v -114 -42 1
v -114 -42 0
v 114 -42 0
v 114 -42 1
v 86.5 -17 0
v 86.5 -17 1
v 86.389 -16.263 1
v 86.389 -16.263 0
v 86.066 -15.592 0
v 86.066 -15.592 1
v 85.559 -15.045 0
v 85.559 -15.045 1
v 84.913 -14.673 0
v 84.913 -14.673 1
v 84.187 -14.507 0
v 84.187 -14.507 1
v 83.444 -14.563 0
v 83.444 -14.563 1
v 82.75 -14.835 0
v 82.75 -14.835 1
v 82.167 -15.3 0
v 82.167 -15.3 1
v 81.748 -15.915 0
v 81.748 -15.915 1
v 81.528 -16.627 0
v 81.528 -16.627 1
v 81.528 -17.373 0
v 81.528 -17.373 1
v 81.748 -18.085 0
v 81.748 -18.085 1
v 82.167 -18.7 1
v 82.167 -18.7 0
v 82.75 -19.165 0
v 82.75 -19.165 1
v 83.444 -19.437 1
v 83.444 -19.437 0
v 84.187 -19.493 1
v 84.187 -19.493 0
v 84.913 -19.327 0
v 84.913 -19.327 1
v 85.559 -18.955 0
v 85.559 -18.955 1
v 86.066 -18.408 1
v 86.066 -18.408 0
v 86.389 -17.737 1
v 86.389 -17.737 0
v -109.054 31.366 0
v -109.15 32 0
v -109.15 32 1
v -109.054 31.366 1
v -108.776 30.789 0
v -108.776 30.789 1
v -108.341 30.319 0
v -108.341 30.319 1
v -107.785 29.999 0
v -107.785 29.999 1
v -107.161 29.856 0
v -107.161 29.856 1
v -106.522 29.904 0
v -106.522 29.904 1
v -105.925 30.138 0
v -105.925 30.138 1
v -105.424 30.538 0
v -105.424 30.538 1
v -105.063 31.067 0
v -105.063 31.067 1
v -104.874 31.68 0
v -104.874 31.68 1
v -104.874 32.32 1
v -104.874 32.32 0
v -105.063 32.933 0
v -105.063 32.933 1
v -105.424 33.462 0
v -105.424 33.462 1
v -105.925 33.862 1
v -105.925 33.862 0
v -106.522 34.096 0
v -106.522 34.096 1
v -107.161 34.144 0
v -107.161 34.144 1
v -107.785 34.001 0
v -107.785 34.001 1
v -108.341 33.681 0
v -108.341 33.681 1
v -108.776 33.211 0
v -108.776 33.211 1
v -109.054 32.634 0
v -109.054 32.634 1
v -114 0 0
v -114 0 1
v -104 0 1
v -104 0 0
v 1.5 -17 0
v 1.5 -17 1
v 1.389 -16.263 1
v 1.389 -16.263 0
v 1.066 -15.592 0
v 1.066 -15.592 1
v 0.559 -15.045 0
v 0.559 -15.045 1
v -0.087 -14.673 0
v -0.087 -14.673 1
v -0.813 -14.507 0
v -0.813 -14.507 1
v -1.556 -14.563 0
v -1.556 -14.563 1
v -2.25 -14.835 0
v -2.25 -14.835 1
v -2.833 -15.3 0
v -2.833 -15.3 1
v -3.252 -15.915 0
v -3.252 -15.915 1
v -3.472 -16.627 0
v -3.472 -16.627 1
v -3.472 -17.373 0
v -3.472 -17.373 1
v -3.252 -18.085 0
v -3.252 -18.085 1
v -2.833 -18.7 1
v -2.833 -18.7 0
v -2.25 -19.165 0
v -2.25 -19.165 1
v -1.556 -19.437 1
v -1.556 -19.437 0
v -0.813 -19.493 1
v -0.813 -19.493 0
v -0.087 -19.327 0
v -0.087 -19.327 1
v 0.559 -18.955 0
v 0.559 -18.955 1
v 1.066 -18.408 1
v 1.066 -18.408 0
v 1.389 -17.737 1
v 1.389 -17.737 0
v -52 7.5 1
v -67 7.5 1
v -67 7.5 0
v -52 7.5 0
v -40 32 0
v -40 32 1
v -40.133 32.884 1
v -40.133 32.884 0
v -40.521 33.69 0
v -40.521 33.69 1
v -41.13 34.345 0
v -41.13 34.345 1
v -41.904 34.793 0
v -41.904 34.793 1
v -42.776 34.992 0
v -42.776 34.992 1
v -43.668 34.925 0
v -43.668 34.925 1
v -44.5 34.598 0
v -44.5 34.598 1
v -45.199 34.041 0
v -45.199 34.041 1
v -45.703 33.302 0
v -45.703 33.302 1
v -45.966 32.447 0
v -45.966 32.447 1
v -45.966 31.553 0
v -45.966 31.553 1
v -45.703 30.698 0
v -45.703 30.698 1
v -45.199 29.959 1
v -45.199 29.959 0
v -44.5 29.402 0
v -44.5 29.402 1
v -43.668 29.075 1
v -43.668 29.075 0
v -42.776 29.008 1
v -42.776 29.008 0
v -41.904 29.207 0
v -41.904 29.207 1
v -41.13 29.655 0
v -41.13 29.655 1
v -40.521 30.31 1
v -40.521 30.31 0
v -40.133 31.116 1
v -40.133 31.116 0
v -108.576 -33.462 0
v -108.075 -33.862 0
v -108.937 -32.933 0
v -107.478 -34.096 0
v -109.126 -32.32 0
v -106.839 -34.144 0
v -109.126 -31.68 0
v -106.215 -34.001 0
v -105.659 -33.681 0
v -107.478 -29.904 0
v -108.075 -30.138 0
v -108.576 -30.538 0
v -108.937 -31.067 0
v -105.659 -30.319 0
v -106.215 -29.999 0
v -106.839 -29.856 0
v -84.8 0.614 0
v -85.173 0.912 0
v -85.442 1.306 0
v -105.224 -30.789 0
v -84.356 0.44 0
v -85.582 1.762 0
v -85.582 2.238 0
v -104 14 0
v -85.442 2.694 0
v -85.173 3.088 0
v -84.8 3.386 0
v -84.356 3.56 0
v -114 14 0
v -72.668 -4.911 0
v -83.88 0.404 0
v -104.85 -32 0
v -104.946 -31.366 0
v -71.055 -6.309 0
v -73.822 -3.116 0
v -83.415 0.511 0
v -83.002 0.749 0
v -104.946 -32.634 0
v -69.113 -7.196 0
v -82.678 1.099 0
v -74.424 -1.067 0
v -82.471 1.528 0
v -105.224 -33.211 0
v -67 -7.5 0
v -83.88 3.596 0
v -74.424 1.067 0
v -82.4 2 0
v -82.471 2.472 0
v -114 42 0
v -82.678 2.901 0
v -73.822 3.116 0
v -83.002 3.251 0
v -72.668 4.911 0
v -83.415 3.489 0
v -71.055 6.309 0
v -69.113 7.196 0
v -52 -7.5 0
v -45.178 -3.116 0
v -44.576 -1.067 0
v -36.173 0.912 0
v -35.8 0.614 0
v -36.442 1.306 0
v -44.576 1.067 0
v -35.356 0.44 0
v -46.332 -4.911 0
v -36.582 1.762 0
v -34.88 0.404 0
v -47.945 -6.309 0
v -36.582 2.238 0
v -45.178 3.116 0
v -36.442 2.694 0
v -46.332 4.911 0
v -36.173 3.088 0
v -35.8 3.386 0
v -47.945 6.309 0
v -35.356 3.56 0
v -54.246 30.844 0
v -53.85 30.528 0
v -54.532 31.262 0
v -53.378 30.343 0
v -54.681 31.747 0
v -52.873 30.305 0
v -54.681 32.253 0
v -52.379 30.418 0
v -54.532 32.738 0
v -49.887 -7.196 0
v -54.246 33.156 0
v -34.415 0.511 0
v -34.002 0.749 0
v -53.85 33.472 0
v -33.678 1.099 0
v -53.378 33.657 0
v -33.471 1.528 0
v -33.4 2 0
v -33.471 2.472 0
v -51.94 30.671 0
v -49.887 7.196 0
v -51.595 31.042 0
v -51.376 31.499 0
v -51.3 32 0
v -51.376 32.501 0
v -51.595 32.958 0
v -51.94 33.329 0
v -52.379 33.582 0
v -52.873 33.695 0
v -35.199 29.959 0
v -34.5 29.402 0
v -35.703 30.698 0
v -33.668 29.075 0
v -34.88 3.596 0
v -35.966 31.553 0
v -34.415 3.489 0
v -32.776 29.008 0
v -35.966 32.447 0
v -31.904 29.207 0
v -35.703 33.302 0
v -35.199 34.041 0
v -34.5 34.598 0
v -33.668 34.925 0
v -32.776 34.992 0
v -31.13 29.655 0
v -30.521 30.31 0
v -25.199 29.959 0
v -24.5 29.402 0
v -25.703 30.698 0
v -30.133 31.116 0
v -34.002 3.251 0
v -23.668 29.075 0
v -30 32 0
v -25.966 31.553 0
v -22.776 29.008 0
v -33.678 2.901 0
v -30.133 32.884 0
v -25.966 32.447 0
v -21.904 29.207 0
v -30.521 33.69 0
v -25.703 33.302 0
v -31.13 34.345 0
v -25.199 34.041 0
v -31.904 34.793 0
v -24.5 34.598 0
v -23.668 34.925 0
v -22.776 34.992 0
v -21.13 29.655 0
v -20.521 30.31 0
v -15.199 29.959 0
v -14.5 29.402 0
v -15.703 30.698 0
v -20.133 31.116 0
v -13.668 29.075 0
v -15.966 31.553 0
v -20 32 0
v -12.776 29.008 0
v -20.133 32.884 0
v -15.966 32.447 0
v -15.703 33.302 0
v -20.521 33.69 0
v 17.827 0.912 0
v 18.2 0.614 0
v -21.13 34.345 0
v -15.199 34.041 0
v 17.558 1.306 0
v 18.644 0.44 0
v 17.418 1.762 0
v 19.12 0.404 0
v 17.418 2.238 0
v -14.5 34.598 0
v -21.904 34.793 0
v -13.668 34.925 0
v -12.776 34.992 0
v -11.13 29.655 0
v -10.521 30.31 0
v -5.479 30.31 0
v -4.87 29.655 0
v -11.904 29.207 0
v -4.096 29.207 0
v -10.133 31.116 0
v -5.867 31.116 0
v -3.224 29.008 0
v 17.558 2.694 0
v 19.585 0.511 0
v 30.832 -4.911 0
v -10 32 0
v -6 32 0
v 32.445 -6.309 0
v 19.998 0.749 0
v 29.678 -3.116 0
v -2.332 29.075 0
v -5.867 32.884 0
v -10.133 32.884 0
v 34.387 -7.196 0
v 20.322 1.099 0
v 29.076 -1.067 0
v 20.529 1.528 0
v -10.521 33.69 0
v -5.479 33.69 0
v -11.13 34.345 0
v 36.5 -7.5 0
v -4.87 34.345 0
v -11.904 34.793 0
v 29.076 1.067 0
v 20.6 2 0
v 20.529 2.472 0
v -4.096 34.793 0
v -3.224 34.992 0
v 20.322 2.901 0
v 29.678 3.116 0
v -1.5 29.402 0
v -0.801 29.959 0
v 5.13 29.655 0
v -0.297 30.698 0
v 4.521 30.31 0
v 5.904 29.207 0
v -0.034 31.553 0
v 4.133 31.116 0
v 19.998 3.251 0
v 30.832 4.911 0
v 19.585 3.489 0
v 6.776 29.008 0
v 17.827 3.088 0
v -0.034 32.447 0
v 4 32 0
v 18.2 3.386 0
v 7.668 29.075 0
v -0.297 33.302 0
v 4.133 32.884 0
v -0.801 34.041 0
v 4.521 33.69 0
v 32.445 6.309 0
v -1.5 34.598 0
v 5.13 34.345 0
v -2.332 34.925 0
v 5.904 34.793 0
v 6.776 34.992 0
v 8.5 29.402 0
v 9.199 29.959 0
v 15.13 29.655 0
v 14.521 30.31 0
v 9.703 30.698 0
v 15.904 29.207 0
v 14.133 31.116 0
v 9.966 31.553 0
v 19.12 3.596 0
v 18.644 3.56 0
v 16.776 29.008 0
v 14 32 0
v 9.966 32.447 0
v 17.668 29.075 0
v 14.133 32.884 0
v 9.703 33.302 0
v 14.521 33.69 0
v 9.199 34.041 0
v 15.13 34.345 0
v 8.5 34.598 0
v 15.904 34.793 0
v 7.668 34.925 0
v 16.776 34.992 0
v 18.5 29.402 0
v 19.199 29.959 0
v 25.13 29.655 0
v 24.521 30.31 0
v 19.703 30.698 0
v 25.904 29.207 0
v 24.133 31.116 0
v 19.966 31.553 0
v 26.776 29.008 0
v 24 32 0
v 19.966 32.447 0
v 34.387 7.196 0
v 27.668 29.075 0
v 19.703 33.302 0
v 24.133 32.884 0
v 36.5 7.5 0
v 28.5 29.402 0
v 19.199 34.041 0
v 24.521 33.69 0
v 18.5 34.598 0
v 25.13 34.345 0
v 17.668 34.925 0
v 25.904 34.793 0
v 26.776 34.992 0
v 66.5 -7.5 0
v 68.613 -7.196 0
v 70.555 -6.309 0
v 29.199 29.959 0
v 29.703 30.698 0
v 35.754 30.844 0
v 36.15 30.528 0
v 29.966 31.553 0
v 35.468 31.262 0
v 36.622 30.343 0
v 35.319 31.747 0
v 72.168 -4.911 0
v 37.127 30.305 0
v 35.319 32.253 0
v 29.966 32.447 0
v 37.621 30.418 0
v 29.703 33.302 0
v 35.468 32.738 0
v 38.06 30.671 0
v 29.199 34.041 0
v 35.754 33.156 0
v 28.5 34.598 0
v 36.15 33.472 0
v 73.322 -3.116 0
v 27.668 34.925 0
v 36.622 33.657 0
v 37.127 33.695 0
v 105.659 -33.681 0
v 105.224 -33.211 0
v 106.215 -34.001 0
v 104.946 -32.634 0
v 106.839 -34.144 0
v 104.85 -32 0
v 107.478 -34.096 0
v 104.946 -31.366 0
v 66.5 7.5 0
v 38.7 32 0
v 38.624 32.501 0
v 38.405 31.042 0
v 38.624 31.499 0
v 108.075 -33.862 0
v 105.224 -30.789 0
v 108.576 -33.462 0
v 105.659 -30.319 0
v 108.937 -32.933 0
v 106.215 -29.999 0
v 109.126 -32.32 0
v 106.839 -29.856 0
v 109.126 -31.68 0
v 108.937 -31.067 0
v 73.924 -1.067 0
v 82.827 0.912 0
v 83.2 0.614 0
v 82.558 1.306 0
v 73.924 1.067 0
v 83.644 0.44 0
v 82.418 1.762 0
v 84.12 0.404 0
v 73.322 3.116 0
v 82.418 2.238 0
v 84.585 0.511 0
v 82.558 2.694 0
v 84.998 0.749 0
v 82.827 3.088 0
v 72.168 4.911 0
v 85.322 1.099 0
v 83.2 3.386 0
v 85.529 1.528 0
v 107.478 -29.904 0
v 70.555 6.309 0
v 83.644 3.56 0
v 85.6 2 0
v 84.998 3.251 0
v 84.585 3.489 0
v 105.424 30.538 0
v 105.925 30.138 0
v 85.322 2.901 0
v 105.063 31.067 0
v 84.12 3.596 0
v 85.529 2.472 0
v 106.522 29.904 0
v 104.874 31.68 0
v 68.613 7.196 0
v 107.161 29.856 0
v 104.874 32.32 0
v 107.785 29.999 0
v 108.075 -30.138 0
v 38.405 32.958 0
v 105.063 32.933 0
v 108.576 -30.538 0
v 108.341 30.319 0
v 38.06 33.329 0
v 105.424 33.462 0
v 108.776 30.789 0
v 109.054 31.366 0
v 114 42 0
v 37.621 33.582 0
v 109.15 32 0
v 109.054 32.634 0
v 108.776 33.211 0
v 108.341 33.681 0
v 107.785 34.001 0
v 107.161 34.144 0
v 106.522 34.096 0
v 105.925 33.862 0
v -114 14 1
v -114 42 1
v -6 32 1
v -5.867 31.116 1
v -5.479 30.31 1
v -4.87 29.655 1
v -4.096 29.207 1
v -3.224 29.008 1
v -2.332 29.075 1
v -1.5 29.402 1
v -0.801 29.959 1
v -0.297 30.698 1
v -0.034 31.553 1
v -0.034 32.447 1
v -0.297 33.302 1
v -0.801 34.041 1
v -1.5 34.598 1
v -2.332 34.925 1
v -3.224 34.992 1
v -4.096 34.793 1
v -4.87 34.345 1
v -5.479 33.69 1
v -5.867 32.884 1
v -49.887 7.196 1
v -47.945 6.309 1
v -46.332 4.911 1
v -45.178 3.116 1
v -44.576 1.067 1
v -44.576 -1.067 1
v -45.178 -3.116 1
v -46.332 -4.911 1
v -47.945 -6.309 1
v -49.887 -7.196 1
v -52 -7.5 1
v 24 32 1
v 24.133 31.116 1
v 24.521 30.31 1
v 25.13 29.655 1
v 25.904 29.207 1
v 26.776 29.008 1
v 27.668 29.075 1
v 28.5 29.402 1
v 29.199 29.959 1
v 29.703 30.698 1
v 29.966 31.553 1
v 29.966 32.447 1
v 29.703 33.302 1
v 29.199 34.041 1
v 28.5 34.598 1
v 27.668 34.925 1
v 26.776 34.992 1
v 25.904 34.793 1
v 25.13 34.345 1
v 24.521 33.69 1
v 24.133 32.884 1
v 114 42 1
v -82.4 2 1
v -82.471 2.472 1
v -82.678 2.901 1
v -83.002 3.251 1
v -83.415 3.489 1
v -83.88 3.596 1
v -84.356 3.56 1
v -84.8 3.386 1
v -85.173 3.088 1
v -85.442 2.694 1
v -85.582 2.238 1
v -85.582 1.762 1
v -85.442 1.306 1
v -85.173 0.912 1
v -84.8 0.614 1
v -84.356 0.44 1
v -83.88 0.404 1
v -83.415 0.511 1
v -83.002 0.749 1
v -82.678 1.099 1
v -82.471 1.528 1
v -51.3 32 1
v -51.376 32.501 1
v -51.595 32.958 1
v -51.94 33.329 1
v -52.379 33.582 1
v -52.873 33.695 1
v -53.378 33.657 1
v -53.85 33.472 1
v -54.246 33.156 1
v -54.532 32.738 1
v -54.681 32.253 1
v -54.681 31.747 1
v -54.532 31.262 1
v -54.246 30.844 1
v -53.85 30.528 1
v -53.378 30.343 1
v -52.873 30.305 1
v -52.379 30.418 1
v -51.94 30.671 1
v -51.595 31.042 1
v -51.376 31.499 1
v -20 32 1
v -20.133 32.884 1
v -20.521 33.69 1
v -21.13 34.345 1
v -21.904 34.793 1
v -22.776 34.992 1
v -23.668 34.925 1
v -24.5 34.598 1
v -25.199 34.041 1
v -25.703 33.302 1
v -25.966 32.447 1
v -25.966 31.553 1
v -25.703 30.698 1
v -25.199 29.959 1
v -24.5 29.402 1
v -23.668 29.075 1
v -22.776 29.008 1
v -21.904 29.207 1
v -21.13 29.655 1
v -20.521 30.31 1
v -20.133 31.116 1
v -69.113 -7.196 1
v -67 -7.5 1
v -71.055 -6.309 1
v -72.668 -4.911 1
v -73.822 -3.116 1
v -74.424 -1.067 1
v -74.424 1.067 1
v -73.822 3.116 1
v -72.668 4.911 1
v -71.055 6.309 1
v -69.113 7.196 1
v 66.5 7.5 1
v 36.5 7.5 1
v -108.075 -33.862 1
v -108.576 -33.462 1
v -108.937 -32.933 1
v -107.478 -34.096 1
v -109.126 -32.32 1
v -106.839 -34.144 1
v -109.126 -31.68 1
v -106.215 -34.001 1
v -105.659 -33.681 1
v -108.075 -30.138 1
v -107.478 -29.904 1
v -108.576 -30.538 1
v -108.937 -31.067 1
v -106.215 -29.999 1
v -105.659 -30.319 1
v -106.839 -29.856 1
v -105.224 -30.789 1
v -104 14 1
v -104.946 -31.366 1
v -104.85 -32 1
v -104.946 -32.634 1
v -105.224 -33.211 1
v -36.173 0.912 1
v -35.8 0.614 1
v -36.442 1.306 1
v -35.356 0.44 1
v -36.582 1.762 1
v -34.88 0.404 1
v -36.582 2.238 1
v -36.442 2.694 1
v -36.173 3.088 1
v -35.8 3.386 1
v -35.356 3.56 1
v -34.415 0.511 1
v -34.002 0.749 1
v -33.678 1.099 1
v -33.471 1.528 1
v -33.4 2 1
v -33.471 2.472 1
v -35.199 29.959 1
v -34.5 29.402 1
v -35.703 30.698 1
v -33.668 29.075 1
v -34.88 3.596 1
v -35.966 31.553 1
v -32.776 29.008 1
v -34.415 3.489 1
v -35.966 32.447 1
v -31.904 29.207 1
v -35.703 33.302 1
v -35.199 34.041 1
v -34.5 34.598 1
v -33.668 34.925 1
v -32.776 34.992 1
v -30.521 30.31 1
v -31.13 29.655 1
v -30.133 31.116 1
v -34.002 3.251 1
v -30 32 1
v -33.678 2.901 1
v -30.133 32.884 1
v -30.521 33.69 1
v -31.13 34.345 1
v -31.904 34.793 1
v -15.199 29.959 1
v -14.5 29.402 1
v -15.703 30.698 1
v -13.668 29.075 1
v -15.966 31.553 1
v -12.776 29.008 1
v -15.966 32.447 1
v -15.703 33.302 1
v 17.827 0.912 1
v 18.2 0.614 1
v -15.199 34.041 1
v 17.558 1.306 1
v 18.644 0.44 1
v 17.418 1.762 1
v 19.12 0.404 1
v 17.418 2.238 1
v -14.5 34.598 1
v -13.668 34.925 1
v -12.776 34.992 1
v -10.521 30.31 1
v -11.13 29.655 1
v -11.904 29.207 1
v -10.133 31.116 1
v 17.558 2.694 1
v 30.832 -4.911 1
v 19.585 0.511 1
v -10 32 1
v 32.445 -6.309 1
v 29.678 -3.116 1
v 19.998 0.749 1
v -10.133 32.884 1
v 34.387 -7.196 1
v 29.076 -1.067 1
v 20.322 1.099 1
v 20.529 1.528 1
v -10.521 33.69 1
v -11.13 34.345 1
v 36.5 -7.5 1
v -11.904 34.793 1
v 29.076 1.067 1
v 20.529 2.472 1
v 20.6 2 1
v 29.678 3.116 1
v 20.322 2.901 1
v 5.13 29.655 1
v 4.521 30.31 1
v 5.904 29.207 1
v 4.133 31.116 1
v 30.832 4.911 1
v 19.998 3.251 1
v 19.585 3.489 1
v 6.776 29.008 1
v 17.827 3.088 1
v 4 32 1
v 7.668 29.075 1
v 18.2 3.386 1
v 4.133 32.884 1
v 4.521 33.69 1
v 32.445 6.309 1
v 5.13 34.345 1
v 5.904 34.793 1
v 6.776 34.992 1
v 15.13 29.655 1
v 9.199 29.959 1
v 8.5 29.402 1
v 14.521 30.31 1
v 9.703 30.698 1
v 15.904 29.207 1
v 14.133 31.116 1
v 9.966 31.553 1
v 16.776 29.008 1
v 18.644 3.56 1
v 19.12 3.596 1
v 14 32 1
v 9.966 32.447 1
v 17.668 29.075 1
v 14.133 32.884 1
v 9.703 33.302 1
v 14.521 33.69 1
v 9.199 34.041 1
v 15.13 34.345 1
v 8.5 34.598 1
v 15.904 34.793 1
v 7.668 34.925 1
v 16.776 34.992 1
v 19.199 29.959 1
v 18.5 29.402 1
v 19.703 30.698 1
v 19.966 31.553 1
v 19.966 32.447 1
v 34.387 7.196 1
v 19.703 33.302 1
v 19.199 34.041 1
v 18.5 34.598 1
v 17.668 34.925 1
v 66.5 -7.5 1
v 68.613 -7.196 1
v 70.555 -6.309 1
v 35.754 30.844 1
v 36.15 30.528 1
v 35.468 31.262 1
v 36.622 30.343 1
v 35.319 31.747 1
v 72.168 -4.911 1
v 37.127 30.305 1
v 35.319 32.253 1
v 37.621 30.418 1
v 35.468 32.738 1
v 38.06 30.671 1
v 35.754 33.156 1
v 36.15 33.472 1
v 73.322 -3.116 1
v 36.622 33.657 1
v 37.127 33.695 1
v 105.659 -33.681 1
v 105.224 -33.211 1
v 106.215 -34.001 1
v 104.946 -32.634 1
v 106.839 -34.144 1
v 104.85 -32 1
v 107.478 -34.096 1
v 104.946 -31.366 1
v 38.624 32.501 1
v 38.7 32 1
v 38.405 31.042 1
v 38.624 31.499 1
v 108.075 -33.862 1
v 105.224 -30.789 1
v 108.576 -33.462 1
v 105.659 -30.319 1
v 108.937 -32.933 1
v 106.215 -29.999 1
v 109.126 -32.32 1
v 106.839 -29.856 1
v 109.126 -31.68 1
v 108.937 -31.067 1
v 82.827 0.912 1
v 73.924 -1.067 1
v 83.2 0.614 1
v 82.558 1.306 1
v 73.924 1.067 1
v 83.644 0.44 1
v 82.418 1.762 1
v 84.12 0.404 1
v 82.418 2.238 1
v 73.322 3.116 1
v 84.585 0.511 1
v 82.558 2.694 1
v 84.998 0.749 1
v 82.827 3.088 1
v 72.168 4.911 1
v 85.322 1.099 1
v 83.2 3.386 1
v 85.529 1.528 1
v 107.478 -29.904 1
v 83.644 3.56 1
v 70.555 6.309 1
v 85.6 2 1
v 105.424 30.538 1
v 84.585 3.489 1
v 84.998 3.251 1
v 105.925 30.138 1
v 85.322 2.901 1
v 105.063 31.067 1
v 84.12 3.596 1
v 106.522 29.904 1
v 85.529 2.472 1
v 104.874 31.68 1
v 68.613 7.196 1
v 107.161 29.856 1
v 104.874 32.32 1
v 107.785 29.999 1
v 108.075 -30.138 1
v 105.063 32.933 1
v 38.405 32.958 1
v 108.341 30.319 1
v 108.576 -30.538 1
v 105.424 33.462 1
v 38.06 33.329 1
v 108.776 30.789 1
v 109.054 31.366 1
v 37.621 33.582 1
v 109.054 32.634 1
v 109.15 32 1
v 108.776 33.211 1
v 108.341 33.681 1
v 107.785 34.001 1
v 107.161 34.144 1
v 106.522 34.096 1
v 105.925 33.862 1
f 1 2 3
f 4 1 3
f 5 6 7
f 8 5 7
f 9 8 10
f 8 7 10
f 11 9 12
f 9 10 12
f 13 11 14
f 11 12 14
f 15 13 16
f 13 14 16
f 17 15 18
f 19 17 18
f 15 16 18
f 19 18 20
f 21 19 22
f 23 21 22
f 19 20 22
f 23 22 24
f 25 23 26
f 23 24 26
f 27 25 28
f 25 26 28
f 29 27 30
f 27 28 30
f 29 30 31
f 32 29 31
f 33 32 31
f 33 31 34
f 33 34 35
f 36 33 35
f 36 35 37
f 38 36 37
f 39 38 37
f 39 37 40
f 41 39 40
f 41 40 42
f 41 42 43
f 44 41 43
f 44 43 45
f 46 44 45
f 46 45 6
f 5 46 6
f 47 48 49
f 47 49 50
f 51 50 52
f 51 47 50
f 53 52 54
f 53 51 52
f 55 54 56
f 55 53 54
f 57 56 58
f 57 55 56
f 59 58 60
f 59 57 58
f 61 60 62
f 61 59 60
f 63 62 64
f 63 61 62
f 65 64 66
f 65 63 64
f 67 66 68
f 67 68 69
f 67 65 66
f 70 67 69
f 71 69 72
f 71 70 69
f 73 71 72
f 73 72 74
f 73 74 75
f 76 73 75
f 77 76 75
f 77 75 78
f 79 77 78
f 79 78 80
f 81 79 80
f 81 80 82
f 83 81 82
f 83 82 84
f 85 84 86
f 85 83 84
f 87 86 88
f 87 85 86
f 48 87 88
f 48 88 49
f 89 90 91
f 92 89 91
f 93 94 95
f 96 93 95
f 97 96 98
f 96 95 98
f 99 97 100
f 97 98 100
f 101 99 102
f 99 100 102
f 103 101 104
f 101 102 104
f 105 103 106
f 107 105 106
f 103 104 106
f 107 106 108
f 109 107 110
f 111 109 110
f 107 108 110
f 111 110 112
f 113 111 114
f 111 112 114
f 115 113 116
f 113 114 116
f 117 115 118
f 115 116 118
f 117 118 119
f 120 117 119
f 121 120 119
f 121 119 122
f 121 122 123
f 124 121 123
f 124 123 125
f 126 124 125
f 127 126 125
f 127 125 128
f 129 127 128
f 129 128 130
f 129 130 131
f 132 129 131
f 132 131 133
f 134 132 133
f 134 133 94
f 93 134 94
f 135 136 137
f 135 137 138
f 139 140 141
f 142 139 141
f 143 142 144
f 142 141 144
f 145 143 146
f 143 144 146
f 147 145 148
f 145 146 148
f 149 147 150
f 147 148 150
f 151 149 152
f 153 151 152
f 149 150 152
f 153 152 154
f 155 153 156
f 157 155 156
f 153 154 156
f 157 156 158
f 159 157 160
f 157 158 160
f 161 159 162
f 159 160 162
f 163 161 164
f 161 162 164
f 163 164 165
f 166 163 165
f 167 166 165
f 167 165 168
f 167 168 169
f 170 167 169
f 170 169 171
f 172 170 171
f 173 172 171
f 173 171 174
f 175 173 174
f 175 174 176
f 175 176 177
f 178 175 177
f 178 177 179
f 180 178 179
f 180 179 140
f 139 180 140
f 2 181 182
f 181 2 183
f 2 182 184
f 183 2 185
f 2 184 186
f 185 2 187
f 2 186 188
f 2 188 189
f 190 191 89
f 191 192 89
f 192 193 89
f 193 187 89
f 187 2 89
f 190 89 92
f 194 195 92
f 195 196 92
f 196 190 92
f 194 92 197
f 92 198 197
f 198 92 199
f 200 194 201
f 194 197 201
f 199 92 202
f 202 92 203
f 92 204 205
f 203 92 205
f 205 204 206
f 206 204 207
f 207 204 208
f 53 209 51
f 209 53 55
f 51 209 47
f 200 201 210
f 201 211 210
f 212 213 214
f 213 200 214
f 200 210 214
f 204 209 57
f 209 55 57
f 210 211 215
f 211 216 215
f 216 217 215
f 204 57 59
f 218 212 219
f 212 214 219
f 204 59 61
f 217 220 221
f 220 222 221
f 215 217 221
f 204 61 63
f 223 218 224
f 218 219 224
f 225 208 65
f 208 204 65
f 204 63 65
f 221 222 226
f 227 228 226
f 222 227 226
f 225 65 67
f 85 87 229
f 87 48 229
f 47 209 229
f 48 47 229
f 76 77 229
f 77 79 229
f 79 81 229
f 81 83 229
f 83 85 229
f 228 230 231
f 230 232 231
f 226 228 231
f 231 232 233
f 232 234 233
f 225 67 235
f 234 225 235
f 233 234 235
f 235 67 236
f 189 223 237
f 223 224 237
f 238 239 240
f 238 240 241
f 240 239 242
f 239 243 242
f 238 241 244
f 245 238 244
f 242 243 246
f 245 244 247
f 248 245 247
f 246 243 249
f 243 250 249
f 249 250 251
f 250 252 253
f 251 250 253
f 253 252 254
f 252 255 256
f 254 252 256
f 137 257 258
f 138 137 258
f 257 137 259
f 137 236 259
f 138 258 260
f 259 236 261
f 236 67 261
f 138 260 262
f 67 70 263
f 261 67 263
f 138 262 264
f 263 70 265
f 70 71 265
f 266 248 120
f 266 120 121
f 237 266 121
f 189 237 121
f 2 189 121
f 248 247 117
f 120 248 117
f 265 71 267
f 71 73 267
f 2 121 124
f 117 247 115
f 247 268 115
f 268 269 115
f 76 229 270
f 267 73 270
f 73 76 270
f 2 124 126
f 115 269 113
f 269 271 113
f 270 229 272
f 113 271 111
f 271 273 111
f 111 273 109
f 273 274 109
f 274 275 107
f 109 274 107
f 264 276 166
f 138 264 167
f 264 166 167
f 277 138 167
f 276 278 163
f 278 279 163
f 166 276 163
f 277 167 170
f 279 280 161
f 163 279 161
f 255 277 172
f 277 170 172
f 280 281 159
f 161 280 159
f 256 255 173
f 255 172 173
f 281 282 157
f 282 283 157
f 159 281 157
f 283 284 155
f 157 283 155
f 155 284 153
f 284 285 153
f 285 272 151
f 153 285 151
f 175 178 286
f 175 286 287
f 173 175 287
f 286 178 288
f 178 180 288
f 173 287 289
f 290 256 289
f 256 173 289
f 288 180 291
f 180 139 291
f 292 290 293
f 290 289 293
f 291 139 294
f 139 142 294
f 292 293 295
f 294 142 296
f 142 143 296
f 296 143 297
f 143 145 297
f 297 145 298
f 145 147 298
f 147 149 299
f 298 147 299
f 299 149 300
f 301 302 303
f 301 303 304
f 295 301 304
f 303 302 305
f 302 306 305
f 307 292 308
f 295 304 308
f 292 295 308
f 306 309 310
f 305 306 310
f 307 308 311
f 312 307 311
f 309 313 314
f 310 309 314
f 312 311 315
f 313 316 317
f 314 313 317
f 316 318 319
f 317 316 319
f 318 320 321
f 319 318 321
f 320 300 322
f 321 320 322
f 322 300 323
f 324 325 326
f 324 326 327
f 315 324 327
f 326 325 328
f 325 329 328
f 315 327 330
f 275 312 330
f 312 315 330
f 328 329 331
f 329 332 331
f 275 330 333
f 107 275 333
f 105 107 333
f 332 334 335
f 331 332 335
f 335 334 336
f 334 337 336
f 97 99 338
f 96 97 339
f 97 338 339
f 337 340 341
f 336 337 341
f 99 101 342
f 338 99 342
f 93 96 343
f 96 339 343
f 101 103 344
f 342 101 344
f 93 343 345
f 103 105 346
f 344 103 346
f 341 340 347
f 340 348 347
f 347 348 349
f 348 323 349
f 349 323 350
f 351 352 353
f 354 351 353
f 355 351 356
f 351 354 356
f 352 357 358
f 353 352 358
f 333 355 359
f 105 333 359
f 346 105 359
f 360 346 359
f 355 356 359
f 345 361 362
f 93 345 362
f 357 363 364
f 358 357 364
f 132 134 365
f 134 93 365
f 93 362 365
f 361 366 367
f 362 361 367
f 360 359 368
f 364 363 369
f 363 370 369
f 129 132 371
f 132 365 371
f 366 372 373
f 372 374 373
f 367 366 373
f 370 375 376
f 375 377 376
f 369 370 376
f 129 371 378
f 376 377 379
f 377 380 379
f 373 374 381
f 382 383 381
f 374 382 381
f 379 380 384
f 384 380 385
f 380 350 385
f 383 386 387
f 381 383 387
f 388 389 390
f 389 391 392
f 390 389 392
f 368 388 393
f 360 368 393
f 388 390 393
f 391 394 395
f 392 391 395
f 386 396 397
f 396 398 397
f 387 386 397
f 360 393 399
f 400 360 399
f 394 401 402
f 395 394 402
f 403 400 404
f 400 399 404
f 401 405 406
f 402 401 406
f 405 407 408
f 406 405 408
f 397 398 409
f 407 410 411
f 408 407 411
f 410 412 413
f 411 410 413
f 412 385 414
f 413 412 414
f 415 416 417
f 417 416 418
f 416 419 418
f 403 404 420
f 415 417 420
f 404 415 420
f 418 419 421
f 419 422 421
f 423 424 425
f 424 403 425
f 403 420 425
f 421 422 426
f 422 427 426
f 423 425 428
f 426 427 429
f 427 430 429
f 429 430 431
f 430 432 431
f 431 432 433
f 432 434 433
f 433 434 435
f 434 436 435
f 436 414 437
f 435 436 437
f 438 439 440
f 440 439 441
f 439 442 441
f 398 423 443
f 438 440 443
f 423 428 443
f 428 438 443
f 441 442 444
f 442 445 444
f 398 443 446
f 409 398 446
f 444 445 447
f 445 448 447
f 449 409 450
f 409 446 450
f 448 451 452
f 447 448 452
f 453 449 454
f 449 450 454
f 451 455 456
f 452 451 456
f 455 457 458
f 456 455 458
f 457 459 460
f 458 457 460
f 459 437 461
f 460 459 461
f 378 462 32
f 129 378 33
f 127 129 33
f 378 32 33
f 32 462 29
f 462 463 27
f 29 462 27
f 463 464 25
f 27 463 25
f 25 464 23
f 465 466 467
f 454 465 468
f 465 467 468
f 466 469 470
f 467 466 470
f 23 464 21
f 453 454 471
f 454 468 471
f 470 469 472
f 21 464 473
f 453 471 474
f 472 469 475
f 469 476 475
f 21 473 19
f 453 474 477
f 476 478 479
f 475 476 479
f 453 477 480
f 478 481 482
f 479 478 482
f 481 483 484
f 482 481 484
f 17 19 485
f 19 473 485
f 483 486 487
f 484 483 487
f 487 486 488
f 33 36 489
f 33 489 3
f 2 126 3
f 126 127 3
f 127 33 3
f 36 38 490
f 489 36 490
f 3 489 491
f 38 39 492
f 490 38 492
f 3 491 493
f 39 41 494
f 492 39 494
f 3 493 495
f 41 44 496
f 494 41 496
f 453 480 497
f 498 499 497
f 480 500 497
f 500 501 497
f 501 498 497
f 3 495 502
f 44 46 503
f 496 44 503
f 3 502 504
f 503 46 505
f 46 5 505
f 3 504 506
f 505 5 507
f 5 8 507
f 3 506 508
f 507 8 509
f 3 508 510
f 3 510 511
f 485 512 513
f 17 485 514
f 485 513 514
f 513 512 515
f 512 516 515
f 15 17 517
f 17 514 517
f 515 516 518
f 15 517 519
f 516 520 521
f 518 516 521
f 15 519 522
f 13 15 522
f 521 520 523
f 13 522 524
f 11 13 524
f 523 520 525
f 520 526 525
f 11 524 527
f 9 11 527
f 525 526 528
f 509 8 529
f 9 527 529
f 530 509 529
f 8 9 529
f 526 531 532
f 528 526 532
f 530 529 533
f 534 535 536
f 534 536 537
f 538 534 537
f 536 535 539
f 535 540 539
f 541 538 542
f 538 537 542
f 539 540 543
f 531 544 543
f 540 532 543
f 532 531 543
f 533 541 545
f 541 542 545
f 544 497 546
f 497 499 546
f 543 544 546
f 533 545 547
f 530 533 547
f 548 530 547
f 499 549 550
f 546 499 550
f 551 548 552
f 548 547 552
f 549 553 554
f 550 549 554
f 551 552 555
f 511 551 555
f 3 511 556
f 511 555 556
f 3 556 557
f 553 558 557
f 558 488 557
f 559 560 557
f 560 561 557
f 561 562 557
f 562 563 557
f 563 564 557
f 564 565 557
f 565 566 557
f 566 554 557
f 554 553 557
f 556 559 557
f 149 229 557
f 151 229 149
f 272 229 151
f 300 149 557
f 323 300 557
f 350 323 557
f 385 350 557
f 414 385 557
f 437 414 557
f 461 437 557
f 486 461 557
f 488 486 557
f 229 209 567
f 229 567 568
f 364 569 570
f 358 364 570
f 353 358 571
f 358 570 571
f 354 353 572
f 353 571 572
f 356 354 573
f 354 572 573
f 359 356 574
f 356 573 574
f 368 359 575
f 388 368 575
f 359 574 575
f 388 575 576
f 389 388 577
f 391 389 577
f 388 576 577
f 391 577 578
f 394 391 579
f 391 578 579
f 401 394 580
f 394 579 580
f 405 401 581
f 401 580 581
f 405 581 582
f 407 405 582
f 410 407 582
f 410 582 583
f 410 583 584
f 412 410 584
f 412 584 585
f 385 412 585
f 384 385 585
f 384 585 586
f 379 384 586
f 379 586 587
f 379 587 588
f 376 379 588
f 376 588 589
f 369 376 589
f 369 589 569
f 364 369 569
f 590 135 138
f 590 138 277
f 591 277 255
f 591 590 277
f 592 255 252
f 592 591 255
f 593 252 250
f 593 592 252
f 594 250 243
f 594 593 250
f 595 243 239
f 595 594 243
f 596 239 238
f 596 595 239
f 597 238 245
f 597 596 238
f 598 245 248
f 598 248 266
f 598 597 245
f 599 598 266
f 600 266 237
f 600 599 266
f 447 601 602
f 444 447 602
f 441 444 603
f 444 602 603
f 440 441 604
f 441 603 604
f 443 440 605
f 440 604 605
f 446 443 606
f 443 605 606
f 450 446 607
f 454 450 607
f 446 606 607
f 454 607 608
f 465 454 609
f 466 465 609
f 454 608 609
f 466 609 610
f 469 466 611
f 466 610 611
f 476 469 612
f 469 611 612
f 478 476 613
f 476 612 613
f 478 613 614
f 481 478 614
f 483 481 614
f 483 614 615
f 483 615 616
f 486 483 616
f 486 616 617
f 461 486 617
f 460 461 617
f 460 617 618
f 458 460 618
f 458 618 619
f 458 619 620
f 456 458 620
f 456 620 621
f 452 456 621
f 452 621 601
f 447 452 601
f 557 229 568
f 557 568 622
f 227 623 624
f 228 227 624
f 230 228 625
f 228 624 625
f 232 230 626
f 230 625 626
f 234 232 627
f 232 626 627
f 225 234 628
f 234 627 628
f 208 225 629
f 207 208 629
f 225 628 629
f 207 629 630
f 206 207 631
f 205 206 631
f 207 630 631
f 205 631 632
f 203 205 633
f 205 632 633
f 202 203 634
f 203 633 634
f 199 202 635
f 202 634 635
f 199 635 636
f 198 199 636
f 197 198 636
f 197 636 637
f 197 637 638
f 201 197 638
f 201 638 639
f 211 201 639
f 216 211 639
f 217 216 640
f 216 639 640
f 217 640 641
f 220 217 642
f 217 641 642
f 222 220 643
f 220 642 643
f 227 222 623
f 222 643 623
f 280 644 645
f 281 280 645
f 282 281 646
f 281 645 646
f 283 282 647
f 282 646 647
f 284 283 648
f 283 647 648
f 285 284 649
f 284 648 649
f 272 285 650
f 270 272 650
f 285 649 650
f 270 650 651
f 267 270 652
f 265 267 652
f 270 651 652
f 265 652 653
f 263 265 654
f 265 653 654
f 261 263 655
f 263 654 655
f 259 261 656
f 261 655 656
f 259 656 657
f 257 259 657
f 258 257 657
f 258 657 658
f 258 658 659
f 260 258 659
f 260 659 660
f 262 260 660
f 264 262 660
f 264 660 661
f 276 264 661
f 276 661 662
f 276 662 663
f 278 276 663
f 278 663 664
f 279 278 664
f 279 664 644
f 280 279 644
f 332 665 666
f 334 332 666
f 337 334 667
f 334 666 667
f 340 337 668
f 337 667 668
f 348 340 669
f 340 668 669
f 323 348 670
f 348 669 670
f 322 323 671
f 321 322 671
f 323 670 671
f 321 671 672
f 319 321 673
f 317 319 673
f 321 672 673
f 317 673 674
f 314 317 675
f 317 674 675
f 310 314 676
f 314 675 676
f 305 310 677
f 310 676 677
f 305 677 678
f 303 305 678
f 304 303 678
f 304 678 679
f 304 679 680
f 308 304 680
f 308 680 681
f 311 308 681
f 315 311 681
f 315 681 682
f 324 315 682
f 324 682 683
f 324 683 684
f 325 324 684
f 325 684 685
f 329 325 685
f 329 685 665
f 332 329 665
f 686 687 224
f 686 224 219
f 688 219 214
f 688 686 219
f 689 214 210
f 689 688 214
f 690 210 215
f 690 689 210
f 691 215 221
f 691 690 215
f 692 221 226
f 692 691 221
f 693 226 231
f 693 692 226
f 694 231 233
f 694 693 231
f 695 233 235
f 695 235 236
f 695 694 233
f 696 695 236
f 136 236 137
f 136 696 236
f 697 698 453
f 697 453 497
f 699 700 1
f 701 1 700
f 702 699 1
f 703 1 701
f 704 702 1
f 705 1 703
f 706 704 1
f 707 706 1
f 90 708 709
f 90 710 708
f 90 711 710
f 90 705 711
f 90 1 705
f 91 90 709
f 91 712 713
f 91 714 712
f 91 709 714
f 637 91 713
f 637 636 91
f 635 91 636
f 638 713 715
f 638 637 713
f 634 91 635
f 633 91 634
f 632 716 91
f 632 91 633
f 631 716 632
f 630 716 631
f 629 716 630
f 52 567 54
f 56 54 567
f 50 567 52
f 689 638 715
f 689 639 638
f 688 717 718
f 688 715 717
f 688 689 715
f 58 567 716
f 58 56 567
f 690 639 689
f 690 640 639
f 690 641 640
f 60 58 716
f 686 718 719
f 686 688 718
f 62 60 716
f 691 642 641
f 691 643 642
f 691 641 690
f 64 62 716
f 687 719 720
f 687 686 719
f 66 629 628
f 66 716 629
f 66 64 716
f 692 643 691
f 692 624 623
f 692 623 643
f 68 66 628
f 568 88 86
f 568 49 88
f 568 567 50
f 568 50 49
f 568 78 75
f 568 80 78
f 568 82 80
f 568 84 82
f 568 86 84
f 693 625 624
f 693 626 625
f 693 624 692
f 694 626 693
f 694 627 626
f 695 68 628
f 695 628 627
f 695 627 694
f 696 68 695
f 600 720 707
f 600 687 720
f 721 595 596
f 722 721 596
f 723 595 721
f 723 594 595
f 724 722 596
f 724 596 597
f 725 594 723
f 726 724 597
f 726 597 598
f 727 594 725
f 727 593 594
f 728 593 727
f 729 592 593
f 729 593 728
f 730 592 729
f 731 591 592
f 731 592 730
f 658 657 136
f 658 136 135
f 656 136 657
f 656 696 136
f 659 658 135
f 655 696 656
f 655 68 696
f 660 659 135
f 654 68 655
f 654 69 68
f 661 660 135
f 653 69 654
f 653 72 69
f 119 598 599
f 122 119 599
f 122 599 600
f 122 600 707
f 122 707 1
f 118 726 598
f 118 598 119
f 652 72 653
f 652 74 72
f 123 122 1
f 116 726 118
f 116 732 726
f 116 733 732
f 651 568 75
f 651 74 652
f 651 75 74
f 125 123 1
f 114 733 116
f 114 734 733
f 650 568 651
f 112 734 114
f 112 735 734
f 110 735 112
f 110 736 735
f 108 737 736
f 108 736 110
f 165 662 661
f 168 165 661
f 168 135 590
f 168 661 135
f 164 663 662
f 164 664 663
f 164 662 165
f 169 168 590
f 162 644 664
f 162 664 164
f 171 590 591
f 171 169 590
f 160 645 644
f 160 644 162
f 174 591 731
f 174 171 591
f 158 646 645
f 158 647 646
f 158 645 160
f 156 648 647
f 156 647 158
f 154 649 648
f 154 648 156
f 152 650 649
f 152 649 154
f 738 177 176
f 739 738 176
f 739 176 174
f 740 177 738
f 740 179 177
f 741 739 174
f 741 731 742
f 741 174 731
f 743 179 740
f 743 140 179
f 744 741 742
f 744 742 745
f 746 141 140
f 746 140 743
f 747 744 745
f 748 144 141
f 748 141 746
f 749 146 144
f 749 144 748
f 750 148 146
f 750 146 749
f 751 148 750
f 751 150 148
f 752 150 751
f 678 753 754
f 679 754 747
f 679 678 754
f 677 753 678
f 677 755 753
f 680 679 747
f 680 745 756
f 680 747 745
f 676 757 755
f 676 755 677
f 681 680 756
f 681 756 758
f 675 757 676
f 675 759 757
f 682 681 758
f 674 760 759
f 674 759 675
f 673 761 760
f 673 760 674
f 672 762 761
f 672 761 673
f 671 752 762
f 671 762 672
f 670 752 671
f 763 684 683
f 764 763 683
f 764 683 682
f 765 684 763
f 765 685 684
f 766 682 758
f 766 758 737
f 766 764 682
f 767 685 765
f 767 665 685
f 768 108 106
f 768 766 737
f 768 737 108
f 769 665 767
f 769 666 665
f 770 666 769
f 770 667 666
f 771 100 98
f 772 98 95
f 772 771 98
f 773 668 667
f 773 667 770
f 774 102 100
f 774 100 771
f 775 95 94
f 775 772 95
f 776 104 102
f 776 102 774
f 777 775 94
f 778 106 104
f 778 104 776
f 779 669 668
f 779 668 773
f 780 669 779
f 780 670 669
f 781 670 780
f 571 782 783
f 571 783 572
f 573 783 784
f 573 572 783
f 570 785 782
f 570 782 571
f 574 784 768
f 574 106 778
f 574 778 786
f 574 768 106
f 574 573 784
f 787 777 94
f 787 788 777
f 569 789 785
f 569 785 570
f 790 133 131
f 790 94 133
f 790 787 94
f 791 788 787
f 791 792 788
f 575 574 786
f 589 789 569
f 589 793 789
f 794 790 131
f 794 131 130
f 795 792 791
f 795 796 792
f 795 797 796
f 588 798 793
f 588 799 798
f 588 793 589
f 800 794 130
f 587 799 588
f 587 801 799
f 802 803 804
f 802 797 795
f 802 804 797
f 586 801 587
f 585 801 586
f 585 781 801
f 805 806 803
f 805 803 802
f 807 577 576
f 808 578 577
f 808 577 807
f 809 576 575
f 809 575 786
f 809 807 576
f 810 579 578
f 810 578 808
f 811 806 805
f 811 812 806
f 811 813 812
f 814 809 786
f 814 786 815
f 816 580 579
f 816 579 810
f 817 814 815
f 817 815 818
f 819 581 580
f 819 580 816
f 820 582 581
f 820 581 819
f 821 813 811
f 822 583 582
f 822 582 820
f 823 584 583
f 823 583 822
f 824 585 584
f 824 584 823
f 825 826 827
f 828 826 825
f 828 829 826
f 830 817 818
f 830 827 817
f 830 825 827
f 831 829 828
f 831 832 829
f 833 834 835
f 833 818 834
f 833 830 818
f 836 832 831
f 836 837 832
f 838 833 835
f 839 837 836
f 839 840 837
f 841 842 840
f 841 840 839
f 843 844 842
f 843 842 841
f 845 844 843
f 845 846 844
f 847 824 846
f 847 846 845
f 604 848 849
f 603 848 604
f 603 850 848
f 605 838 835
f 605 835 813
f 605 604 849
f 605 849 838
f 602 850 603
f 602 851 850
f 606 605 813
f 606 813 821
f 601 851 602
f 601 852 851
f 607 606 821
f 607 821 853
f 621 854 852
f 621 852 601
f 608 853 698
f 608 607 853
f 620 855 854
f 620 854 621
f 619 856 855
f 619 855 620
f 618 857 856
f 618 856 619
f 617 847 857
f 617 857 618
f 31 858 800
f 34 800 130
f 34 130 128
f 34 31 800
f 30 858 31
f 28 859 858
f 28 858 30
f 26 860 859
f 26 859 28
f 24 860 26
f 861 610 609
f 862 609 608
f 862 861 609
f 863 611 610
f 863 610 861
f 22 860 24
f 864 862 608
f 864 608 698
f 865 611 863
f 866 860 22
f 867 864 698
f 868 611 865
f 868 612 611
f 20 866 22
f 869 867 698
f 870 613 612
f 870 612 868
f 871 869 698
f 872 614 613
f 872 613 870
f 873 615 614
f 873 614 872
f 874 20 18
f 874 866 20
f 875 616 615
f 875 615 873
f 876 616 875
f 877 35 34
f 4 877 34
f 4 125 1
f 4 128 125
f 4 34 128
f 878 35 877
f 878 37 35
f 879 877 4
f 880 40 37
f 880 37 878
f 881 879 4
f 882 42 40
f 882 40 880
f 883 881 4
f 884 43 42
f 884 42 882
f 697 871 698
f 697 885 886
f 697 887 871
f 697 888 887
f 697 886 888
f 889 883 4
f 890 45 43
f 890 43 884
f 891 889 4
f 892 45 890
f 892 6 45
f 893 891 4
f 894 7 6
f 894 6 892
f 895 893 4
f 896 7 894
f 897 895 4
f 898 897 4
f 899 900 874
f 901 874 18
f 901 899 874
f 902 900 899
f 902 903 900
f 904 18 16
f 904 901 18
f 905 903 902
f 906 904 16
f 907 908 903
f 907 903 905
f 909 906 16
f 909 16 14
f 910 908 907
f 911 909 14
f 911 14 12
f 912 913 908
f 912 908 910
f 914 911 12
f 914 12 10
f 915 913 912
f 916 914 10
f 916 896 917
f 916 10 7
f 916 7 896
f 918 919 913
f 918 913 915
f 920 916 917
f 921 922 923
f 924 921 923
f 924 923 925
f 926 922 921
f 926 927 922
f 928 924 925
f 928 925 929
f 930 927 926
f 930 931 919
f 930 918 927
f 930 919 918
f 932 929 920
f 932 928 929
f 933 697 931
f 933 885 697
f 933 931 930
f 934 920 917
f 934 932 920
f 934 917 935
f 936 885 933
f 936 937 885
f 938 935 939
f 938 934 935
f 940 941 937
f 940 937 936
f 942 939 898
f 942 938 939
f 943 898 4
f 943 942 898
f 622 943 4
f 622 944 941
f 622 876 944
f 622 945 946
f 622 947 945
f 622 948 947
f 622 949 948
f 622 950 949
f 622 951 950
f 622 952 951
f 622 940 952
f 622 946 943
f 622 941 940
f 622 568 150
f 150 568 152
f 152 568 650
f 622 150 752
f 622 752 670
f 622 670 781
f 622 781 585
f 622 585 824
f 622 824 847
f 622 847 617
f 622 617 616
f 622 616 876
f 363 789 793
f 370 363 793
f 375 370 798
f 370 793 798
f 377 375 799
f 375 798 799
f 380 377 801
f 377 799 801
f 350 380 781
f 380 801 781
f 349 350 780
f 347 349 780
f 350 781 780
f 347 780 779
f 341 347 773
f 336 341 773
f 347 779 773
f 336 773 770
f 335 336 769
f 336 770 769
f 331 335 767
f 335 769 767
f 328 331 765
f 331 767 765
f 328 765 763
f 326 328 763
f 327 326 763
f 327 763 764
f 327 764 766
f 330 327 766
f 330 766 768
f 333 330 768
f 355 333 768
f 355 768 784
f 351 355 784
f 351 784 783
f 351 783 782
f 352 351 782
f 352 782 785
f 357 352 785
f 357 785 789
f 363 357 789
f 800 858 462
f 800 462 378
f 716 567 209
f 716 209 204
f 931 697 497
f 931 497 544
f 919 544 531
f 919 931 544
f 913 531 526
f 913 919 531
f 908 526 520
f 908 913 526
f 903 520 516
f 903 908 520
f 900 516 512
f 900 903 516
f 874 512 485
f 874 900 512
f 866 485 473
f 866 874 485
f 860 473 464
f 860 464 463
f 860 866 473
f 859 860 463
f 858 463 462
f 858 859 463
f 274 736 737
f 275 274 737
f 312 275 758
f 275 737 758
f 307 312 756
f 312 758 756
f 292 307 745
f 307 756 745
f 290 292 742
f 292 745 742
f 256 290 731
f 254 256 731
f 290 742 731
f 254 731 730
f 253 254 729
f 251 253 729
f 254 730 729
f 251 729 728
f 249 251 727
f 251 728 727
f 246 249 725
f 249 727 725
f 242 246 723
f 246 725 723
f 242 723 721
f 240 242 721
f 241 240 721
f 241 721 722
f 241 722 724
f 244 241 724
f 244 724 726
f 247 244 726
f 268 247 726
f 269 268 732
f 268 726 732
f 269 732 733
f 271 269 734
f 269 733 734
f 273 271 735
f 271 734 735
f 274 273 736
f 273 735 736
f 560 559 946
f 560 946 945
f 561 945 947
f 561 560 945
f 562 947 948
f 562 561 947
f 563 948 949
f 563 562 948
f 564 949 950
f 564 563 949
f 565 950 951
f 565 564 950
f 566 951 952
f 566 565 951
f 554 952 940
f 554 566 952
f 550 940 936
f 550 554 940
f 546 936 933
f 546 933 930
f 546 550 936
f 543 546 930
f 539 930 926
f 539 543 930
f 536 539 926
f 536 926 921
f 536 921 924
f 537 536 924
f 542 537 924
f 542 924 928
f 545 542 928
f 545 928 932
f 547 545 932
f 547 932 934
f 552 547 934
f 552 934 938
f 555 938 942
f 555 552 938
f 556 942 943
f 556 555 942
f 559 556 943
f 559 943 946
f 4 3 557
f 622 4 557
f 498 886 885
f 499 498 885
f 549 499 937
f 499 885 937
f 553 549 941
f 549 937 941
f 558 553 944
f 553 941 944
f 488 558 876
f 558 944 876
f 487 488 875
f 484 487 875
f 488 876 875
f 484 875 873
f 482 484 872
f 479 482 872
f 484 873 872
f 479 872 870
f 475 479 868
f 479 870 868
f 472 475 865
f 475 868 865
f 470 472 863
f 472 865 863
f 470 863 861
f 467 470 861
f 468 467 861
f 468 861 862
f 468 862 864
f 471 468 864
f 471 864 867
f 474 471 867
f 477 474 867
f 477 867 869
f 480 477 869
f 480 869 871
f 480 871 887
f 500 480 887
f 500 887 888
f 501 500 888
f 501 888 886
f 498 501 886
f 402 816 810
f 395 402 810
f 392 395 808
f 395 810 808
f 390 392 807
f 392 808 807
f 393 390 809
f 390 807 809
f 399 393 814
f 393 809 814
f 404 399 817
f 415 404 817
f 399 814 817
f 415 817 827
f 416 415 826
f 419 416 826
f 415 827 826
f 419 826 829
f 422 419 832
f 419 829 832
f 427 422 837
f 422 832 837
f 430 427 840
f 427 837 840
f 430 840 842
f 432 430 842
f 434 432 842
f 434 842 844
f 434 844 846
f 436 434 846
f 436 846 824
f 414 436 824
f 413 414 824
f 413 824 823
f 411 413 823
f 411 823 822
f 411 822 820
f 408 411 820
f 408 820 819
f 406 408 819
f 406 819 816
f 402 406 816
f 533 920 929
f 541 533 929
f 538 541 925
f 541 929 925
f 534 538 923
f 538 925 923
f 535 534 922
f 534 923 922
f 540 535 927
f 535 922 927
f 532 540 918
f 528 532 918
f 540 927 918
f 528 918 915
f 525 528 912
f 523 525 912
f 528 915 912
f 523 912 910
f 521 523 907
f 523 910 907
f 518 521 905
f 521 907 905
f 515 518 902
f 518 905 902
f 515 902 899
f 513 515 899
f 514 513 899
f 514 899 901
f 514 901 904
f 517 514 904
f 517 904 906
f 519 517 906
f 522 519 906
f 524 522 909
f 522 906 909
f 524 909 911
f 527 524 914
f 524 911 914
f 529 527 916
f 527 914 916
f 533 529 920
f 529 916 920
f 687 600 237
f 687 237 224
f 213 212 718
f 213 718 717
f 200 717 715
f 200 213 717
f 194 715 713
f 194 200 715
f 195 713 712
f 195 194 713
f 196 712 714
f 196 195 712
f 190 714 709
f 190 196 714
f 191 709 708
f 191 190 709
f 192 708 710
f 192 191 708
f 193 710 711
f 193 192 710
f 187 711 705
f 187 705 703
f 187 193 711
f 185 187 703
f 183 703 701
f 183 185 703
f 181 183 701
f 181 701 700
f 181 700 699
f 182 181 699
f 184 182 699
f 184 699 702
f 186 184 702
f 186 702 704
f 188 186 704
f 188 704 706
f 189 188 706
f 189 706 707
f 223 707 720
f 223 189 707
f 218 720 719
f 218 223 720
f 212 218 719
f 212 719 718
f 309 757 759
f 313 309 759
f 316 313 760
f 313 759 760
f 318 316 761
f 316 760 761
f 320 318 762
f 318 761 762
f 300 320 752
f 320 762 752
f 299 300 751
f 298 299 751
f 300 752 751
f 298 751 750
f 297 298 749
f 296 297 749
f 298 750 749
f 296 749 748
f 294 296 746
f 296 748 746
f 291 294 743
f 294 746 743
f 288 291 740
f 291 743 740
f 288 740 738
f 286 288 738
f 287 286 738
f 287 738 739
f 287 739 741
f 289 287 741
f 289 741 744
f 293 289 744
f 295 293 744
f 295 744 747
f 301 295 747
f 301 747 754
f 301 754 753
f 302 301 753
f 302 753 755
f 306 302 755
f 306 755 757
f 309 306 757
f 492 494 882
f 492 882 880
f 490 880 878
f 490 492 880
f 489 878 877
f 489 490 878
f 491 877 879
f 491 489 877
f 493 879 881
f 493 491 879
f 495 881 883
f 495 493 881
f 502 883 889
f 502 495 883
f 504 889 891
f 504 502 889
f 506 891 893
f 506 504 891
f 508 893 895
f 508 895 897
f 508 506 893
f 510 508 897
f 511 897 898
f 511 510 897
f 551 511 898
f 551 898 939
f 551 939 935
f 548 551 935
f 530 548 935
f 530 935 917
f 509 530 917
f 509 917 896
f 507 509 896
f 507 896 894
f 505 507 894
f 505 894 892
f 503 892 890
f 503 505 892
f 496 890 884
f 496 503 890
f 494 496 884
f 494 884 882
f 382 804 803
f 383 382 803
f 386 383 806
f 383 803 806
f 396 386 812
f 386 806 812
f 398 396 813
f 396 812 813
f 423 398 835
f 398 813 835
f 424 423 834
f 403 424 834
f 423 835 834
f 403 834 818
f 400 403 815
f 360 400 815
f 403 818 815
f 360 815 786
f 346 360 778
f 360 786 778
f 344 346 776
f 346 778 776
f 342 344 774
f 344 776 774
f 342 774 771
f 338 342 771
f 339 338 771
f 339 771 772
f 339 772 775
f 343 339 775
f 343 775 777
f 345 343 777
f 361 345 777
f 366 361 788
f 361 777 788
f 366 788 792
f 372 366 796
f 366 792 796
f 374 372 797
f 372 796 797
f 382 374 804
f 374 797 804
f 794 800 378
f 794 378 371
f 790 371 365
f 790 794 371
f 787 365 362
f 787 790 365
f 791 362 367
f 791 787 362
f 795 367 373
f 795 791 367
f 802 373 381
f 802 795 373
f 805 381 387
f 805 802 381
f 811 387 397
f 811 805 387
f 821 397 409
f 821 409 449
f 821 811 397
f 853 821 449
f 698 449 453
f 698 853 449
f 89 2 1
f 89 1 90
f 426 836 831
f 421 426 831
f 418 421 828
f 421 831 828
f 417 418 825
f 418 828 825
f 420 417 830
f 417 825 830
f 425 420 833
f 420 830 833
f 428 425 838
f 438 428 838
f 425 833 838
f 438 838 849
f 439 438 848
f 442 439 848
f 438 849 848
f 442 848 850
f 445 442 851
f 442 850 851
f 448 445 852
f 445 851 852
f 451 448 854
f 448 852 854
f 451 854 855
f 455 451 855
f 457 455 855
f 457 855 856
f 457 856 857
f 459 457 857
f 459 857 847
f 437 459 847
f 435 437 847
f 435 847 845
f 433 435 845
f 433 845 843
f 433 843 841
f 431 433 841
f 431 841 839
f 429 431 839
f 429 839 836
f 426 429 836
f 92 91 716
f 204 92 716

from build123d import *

# Parameters (mm, degrees)
SKETCH_1_W          = 228
SKETCH_1_H          = 84
SKETCH_1_R          = 2.15
EXTRUDE_1_DEPTH     = 1
SKETCH_4_R          = 1.6
SKETCH_4_W          = 14.464145402
SKETCH_4_H          = 14
CUT_EXTRUDE_2_DEPTH = 1
SKETCH_5_R          = 1.7
SKETCH_5_R_2        = 3
SKETCH_5_R_3        = 2.5
CUT_EXTRUDE_3_DEPTH = 10


with BuildPart() as part:
    # Эскиз1 → Вытянуть1 (new body)
    with BuildSketch(Plane.XY):
        Rectangle(SKETCH_1_W, SKETCH_1_H)
        with Locations((107, 32)):
            Circle(SKETCH_1_R, mode=Mode.SUBTRACT)
        with Locations(Location((-107, 32, 0), (0, 0, 180))):
            Circle(SKETCH_1_R, mode=Mode.SUBTRACT)
        with Locations((-107, -32)):
            Circle(SKETCH_1_R, mode=Mode.SUBTRACT)
        with Locations(Location((107, -32, 0), (0, 0, 180))):
            Circle(SKETCH_1_R, mode=Mode.SUBTRACT)
    extrude(amount=EXTRUDE_1_DEPTH)

    # Эскиз4 → Вырез-Вытянуть2 (cut)
    with BuildSketch(Plane.XY.offset(1)):
        with Locations((19, 2)):
            Circle(SKETCH_4_R)
        with Locations((84, 2)):
            Circle(SKETCH_4_R)
        with Locations((-84, 2)):
            Circle(SKETCH_4_R)
        with Locations((-35, 2)):
            Circle(SKETCH_4_R)
        with BuildLine():
            Line((36.5, 7.5), (66.5, 7.5))
            ThreePointArc((66.5, 7.5), (74, 0), (66.5, -7.5))
            Line((66.5, -7.5), (36.5, -7.5))
            ThreePointArc((36.5, -7.5), (29, 0), (36.5, 7.5))
        make_face()
        with BuildLine():
            Line((-67, 7.5), (-52, 7.5))
            ThreePointArc((-52, 7.5), (-44.5, 0), (-52, -7.5))
            Line((-52, -7.5), (-67, -7.5))
            ThreePointArc((-67, -7.5), (-74.5, 0), (-67, 7.5))
        make_face()
        with Locations((-111.232072701, 7)):
            Rectangle(SKETCH_4_W, SKETCH_4_H)
    extrude(amount=-CUT_EXTRUDE_2_DEPTH, mode=Mode.SUBTRACT)

    # Эскиз5 → Вырез-Вытянуть3 (cut)
    with BuildSketch(Plane.XY.offset(1)):
        with Locations((-53, 32)):
            Circle(SKETCH_5_R)
        with Locations((37, 32)):
            Circle(SKETCH_5_R)
        with Locations((-13, 32)):
            Circle(SKETCH_5_R_2)
        with Locations((-23, 32)):
            Circle(SKETCH_5_R_2)
        with Locations((-33, 32)):
            Circle(SKETCH_5_R_2)
        with Locations((-43, 32)):
            Circle(SKETCH_5_R_2)
        with Locations((-1, -17)):
            Circle(SKETCH_5_R_3)
        with Locations((84, -17)):
            Circle(SKETCH_5_R_3)
        with Locations(Location((-3, 32, 0), (0, 0, 180))):
            Circle(SKETCH_5_R_2)
        with Locations(Location((7, 32, 0), (0, 0, 180))):
            Circle(SKETCH_5_R_2)
        with Locations(Location((17, 32, 0), (0, 0, 180))):
            Circle(SKETCH_5_R_2)
        with Locations(Location((27, 32, 0), (0, 0, 180))):
            Circle(SKETCH_5_R_2)
    extrude(amount=-CUT_EXTRUDE_3_DEPTH, mode=Mode.SUBTRACT)


solid = part.part
